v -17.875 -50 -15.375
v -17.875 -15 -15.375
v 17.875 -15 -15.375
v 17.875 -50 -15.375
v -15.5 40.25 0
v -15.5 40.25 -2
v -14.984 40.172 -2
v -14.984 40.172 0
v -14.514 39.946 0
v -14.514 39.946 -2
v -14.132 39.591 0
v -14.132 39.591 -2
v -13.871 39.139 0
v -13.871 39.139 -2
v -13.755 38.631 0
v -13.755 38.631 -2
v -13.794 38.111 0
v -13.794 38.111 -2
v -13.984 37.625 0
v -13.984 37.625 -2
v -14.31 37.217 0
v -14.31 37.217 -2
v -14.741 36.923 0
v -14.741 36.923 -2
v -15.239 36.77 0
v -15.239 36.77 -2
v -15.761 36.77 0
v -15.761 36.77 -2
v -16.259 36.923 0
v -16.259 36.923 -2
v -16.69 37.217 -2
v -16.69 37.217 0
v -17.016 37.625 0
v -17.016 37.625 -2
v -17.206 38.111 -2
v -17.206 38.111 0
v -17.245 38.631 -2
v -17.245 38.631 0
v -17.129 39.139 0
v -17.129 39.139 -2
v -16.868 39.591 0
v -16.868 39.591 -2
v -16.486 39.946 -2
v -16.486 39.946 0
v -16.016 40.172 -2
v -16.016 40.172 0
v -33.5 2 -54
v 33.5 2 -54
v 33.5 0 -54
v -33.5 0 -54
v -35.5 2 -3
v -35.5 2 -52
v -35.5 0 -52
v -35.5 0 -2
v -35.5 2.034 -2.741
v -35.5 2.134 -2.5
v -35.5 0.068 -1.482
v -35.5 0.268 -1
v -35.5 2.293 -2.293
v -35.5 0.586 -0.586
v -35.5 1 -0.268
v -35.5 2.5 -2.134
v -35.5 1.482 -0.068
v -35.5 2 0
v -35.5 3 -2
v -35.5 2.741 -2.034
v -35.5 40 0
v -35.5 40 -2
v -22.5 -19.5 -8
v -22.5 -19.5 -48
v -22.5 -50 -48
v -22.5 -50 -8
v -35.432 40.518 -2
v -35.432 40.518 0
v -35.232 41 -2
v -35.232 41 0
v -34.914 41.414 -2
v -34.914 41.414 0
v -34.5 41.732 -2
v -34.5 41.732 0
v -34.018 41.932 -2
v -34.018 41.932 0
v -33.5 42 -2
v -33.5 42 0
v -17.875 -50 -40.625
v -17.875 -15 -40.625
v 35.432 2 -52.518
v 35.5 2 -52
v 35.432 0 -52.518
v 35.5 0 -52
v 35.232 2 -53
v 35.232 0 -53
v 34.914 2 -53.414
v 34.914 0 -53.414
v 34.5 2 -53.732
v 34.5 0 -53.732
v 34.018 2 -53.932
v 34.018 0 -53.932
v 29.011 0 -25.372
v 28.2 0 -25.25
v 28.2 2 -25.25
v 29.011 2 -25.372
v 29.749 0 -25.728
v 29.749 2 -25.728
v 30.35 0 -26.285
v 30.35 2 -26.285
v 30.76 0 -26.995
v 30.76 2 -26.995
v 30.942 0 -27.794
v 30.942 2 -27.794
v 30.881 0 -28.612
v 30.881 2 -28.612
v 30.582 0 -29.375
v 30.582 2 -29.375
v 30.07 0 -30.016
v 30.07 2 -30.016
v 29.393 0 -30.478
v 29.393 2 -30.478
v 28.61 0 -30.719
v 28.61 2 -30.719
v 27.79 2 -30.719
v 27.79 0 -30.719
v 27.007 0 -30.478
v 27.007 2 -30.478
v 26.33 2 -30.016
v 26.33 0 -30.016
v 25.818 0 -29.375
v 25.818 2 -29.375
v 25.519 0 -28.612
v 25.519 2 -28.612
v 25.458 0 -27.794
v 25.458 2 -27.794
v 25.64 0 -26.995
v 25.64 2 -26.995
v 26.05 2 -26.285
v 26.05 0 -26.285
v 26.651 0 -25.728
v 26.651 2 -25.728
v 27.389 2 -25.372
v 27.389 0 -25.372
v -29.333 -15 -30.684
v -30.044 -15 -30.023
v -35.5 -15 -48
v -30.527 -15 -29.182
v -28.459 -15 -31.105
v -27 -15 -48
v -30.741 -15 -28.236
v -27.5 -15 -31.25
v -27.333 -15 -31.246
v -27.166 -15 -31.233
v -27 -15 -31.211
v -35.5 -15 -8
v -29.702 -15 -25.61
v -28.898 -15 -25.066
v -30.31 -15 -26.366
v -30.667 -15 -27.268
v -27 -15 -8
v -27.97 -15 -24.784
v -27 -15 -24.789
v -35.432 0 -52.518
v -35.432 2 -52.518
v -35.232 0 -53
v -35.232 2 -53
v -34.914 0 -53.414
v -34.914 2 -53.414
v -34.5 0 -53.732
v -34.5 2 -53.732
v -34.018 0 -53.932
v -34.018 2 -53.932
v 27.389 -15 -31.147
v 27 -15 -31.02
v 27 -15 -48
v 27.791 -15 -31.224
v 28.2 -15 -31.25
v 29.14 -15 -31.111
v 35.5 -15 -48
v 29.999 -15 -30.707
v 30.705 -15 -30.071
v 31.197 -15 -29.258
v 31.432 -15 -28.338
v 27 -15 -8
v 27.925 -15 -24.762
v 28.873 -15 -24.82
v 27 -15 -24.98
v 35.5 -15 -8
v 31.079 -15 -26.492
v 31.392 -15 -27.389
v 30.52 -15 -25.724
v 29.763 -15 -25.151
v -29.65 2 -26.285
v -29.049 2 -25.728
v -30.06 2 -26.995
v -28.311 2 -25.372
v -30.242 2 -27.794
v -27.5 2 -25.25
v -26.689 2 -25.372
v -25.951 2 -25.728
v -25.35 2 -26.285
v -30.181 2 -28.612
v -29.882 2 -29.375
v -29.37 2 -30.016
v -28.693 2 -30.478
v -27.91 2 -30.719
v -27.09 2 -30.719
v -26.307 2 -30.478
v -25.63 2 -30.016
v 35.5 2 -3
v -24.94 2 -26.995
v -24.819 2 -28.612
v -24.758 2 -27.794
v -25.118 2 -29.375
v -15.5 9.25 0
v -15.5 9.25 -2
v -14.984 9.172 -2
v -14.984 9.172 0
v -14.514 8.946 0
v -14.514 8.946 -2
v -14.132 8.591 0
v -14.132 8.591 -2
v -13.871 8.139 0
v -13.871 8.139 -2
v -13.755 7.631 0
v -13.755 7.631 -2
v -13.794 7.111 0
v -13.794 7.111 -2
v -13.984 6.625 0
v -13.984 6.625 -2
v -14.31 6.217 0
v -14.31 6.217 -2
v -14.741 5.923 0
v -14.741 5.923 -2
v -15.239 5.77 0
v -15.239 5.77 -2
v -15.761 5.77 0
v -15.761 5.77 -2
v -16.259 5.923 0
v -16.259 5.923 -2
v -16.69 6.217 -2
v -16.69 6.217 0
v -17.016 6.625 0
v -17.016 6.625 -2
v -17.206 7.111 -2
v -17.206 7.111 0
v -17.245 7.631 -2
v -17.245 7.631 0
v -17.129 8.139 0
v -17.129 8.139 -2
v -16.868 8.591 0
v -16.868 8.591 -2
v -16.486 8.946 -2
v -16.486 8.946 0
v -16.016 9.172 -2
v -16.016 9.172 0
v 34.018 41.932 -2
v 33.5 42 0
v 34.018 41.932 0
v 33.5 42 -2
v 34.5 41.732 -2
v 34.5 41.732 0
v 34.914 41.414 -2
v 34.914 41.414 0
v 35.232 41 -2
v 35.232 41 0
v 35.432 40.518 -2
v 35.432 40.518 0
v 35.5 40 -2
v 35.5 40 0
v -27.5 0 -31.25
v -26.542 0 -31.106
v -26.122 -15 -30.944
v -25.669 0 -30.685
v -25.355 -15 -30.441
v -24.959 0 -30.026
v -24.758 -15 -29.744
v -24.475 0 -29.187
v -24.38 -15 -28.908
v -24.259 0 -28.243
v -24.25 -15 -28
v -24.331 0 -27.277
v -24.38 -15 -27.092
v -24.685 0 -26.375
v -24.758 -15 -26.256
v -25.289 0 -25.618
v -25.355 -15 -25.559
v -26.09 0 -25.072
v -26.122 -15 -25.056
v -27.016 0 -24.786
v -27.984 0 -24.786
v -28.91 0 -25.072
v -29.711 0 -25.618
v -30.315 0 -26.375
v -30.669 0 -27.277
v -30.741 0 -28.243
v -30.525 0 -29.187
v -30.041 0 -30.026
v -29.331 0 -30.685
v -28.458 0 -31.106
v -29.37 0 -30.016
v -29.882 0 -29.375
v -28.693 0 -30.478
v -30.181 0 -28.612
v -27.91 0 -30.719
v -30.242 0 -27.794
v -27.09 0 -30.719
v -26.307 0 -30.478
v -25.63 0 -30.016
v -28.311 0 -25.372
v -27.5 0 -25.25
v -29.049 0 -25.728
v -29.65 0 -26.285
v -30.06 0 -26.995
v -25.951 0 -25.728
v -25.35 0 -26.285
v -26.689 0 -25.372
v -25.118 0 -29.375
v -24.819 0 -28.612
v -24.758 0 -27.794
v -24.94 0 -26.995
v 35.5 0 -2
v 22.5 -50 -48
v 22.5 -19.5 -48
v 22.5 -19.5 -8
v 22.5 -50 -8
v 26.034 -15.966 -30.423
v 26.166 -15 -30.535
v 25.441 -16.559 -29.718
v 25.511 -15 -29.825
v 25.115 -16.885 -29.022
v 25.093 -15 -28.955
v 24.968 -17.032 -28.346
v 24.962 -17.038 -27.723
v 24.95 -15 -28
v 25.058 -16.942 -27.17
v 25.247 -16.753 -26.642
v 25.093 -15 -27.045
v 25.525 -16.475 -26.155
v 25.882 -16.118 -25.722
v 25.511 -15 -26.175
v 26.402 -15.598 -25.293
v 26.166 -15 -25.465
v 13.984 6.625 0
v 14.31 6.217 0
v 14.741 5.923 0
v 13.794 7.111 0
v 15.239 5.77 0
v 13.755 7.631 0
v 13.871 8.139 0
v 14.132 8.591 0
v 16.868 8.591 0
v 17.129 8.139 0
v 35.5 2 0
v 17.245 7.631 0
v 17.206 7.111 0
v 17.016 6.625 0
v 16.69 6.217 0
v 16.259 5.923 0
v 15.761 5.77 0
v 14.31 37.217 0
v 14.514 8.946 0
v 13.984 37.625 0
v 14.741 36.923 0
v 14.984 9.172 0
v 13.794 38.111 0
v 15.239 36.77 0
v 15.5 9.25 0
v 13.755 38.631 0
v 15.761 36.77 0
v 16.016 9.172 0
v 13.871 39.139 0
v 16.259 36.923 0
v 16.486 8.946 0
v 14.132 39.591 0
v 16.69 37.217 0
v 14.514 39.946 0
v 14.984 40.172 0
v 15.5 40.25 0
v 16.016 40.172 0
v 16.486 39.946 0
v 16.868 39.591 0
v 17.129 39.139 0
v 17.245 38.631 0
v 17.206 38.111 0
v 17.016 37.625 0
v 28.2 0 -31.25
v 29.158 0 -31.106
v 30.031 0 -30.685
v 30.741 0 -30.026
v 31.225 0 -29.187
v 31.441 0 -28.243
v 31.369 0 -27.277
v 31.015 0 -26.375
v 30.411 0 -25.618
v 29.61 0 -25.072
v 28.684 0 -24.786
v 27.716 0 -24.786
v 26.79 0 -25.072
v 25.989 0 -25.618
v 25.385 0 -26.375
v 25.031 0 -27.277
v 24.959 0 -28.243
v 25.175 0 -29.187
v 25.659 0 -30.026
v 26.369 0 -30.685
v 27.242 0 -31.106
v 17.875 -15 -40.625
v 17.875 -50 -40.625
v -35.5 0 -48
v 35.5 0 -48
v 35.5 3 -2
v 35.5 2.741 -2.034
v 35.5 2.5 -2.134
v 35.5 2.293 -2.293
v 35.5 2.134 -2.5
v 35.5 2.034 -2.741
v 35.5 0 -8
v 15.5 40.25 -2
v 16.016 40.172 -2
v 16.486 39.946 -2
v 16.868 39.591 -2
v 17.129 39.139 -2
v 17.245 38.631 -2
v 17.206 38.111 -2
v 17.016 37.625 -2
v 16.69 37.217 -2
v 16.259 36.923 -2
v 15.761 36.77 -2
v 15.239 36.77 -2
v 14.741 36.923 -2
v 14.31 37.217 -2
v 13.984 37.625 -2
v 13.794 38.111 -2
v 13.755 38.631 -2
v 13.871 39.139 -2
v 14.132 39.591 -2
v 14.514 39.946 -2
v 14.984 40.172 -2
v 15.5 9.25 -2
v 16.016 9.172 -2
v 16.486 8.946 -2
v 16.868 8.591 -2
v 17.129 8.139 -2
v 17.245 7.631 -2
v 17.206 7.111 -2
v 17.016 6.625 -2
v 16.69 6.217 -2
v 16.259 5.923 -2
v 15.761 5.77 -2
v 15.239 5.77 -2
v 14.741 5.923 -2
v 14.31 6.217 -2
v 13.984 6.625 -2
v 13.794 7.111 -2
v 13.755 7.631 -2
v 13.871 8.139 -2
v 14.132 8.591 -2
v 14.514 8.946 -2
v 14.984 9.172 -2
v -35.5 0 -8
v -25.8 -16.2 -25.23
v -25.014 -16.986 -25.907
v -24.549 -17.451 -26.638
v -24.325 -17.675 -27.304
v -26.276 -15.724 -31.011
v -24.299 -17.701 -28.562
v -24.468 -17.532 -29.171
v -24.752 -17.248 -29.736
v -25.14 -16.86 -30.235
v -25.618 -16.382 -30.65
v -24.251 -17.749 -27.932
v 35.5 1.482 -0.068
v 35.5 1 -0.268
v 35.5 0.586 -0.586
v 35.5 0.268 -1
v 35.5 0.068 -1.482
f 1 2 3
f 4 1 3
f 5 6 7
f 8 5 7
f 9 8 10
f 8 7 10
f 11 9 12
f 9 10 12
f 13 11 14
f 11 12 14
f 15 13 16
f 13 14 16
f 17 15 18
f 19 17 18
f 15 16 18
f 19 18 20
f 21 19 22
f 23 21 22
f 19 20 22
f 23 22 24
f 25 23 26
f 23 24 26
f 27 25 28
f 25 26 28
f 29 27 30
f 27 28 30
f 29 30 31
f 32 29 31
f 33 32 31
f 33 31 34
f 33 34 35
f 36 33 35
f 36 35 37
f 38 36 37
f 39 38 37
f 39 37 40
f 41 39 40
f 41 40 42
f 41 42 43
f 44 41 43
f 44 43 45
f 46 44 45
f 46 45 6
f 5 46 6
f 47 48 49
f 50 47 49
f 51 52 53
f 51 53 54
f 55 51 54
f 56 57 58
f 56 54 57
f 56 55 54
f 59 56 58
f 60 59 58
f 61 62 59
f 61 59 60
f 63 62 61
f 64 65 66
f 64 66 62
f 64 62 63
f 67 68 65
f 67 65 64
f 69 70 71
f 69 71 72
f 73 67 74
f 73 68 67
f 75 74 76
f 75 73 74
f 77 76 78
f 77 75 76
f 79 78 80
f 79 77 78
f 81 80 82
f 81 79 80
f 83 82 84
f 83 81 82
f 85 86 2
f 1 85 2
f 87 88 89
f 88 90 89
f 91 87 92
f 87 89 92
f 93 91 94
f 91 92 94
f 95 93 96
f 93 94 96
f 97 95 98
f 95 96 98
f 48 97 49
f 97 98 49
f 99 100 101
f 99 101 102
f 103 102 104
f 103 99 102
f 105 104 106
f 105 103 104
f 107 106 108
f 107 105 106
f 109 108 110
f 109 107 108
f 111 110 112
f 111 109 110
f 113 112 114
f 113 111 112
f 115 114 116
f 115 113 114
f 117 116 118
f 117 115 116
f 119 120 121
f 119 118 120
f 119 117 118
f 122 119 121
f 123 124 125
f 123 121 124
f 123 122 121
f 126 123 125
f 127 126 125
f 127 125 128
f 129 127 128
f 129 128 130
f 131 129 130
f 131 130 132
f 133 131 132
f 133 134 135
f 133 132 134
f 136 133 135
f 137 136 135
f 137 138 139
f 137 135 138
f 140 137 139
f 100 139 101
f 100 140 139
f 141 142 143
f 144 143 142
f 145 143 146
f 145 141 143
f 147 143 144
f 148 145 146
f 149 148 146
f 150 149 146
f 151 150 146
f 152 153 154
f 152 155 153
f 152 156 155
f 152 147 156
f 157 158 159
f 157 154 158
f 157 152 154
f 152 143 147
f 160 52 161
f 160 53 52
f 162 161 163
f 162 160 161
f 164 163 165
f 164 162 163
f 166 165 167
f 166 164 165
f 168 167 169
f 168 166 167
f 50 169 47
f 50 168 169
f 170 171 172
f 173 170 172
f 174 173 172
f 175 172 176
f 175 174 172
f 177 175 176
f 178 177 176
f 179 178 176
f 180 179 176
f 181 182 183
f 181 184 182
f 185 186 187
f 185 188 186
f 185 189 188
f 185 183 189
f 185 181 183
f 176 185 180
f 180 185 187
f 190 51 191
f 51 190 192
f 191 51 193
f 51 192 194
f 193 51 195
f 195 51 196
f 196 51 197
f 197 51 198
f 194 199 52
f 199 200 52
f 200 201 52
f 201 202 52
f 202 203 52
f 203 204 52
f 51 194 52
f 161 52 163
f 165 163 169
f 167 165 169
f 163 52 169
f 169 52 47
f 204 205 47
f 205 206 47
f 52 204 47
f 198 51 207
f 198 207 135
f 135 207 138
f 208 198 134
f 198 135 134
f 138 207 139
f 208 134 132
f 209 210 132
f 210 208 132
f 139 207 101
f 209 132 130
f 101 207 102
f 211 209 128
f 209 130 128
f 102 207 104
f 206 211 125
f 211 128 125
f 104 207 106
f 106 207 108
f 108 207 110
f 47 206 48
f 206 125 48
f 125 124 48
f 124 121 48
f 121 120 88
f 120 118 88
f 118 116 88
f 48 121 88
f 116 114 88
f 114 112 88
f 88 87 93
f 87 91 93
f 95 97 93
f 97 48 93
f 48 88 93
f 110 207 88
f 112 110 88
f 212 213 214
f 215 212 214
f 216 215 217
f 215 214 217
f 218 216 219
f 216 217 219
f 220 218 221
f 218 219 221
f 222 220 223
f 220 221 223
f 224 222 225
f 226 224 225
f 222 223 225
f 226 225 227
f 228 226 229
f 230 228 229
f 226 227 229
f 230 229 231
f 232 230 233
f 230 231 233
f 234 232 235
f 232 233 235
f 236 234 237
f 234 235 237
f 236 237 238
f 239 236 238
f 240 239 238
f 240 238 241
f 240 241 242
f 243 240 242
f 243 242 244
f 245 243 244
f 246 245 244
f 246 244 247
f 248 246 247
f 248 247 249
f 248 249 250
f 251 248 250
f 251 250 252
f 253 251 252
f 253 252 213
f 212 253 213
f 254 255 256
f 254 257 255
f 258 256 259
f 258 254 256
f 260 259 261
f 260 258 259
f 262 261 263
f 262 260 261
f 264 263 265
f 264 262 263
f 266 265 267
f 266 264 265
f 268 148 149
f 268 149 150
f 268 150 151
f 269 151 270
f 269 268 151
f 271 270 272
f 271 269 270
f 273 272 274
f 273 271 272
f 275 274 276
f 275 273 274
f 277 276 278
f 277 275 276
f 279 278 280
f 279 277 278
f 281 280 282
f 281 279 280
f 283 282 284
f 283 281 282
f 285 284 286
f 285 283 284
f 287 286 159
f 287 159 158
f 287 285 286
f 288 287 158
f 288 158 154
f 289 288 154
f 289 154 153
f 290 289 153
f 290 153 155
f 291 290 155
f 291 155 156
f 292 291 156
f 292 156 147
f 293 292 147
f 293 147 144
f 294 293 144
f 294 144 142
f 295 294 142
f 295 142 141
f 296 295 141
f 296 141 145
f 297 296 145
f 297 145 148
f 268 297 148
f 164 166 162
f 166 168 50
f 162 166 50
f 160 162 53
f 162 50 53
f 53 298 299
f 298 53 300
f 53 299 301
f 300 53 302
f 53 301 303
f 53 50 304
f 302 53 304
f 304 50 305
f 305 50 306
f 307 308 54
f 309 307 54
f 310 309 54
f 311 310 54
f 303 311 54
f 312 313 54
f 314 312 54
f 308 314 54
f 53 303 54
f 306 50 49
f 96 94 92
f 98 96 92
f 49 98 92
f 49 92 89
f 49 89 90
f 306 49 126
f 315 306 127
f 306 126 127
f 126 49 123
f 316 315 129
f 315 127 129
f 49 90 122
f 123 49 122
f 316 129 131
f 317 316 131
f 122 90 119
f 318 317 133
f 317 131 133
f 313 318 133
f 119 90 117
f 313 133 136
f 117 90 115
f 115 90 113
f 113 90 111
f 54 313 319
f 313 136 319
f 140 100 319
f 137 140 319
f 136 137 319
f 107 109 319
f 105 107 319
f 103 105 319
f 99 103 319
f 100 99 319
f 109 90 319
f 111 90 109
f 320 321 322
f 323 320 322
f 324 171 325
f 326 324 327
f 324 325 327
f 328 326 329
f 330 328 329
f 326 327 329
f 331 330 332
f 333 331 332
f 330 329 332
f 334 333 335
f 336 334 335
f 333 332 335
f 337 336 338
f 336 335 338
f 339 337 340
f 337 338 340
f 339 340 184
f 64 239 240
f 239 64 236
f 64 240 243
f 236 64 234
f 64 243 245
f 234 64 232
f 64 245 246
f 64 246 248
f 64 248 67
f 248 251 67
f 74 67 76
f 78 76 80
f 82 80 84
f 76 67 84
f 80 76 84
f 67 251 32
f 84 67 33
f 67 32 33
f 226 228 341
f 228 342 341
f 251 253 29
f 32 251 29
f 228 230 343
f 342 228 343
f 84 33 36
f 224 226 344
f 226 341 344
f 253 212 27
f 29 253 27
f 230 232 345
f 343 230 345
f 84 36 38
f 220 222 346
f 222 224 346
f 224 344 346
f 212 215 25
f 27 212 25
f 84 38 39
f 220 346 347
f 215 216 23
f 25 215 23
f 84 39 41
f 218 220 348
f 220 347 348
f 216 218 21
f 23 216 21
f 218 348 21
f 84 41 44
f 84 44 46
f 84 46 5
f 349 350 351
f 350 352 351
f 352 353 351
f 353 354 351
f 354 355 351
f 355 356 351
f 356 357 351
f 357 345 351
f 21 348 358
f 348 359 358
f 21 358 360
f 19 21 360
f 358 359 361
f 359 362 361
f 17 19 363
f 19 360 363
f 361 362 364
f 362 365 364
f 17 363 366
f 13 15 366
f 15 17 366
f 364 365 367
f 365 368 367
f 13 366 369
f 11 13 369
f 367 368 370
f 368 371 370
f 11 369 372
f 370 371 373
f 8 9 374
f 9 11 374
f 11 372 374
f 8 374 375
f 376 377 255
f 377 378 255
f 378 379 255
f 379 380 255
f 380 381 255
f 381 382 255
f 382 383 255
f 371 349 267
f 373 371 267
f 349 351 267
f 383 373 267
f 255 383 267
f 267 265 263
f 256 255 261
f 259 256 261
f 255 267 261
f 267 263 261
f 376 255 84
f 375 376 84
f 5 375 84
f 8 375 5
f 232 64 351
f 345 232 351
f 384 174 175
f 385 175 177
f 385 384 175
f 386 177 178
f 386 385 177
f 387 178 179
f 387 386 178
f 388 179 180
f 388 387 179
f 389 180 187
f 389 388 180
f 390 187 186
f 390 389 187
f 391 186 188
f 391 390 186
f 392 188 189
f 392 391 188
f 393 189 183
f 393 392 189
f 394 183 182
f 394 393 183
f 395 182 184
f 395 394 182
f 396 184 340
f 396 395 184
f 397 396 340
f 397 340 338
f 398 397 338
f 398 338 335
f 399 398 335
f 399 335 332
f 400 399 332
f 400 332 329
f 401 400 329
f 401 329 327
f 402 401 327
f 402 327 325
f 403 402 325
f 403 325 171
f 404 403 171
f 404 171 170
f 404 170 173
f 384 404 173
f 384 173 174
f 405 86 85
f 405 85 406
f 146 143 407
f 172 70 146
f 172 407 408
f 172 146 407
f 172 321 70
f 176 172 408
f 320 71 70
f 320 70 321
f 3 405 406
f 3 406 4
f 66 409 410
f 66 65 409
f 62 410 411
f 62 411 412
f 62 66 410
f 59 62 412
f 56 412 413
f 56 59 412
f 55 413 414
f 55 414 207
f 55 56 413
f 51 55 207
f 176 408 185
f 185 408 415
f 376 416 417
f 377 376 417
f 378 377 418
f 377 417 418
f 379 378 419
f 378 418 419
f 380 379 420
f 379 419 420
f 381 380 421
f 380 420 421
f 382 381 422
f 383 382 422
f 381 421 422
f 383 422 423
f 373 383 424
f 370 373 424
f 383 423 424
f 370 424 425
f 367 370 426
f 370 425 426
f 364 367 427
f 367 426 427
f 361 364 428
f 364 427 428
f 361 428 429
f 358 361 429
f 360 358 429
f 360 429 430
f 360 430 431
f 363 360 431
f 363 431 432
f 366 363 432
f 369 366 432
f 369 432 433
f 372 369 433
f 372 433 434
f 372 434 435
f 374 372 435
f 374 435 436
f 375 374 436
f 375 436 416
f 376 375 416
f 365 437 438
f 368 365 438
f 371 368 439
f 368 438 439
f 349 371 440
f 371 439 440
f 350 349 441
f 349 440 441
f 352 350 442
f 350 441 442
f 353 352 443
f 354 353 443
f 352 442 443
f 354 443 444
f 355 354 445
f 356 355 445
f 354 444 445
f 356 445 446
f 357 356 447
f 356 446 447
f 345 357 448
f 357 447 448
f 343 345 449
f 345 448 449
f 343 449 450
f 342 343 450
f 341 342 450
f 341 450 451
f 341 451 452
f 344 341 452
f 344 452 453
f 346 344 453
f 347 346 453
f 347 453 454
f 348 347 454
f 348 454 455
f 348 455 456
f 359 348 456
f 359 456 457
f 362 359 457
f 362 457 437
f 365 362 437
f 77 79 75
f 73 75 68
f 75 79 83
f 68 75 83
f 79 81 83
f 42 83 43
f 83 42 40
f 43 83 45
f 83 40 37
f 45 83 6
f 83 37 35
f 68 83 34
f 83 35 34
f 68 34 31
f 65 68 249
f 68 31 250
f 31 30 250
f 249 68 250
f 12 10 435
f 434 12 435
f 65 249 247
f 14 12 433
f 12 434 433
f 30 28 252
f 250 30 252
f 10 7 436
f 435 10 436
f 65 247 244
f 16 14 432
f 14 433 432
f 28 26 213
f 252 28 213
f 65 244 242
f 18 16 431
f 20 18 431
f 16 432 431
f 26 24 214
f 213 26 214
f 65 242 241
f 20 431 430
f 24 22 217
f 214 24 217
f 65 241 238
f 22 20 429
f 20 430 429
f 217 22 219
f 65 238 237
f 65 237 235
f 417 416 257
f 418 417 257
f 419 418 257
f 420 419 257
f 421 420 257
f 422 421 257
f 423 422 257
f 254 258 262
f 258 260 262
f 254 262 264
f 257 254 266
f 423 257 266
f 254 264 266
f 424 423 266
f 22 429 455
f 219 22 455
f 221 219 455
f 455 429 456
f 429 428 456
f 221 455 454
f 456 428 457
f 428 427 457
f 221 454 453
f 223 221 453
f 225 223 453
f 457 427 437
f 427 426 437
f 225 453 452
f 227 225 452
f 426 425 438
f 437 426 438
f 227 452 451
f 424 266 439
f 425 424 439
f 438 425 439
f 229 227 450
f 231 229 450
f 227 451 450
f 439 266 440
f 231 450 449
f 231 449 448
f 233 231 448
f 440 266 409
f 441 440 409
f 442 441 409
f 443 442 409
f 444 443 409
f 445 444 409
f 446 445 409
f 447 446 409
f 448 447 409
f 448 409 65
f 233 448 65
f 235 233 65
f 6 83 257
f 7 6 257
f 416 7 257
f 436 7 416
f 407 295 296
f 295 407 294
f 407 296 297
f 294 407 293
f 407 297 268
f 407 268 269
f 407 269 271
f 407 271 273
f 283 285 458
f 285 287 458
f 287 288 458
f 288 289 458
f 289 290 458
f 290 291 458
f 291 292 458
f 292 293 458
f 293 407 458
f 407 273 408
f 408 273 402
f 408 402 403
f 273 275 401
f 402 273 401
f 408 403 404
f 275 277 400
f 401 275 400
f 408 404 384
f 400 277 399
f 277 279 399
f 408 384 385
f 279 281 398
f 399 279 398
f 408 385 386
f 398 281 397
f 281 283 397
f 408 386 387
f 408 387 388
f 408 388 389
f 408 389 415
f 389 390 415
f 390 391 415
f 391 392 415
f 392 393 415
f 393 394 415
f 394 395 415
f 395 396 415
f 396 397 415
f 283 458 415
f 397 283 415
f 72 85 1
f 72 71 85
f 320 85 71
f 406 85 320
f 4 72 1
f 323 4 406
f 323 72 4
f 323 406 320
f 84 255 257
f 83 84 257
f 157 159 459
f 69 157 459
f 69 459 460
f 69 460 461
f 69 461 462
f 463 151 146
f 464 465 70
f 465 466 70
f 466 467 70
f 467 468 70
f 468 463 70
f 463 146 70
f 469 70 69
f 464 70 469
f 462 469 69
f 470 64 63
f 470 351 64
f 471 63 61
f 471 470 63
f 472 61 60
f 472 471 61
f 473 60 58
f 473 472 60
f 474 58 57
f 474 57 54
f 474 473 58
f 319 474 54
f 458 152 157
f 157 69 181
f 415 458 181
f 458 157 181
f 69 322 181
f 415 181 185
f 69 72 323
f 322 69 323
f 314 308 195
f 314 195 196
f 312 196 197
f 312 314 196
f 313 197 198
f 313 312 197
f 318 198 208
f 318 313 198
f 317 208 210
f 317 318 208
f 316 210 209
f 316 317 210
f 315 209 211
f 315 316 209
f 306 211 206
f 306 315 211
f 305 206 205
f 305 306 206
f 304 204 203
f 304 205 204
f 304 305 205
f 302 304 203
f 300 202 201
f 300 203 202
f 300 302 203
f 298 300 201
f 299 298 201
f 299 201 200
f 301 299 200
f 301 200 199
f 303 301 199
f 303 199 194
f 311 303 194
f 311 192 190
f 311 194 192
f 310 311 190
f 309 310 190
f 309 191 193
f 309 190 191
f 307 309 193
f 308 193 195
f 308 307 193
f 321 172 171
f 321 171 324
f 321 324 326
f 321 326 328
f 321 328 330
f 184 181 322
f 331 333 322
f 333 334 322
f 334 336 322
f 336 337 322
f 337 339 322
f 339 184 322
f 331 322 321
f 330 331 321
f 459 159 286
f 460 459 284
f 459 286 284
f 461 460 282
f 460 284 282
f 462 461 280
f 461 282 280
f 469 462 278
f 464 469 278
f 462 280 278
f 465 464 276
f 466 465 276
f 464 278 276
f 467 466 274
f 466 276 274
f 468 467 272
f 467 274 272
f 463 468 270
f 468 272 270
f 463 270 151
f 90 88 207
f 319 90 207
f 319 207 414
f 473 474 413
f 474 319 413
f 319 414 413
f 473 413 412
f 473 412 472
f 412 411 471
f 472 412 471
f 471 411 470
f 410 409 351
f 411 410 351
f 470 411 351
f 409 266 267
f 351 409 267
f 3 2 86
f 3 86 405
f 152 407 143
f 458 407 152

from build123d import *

# Parameters (mm, degrees)
RESSALTO_EXTRUS_O1_DEPTH   = 35.5
CORTE_EXTRUS_O1_DEPTH      = 77.001644719
CORTE_EXTRUS_O1_DEPTH_BACK = 77.001644719
ESBO_O2_R                  = 2.75
FILETE1_R                  = 2
FILETE2_R                  = 1
ESBO_O3_R                  = 1.75
CORTE_EXTRUS_O2_DEPTH      = 76.685203309
ESBO_O4_W                  = 71
ESBO_O4_H                  = 40
ESBO_O4_R                  = 3.25
RESSALTO_EXTRUS_O2_DEPTH   = 15
ESBO_O5_W                  = 45
ESBO_O5_H                  = 40
ESBO_O5_W_2                = 35.75
ESBO_O5_H_2                = 25.25
RESSALTO_EXTRUS_O3_DEPTH   = 35
CHANFRO1_SIZE              = 4.5


with BuildPart() as part:
    # Esboço1 → Ressalto-extrusão1 (new, symmetric)
    with BuildSketch(Plane(origin=(0, 0, 0), x_dir=(0, 0, -1), z_dir=(1, 0, 0))):
        Polygon((0, 0), (0, 42), (2, 42), (2, 2), (54, 2), (54, 0), align=None)
    extrude(amount=RESSALTO_EXTRUS_O1_DEPTH, both=True)

    # Esboço2 → Corte-extrusão1 (cut, two sides: drawn at the far end of the back side and taken through both)
    with BuildSketch(Plane(origin=(0, 2, 0), x_dir=(1, 0, 0), z_dir=(0, 1, 0)).offset(-CORTE_EXTRUS_O1_DEPTH_BACK)):
        with Locations(Location((-27.5, 28, 0), (0, 0, 270))):
            Circle(ESBO_O2_R)
        with Locations(Location((28.2, 28, 0), (0, 0, 270))):
            Circle(ESBO_O2_R)
    extrude(amount=CORTE_EXTRUS_O1_DEPTH + CORTE_EXTRUS_O1_DEPTH_BACK, mode=Mode.SUBTRACT)

    # Filete1
    filete1_edges = [part.edges().sort_by_distance(p)[0] for p in [
        (0, 0, 0),
        (35.5, 42, -1),
        (-35.5, 42, -1),
        (-35.5, 1, -54),
        (35.5, 1, -54),
    ]]
    fillet(filete1_edges, radius=FILETE1_R)

    # Filete2
    filete2_edges = [part.edges().sort_by_distance(p)[0] for p in [
        (0, 2, -2),
    ]]
    fillet(filete2_edges, radius=FILETE2_R)

    # Esboço3 → Corte-extrusão2 (cut, through all)
    with BuildSketch(Plane(origin=(0, 0, -2), x_dir=(-1, 0, 0), z_dir=(0, 0, -1))):
        with Locations(Location((-15.5, 38.5, 0), (0, 0, 90))):
            Circle(ESBO_O3_R)
        with Locations(Location((15.5, 38.5, 0), (0, 0, 90))):
            Circle(ESBO_O3_R)
        with Locations(Location((15.5, 7.5, 0), (0, 0, 90))):
            Circle(ESBO_O3_R)
        with Locations(Location((-15.5, 7.5, 0), (0, 0, 90))):
            Circle(ESBO_O3_R)
    extrude(amount=-CORTE_EXTRUS_O2_DEPTH, mode=Mode.SUBTRACT)


with BuildPart() as body_2:
    # Esboço4 → Ressalto-extrusão2 (new body)
    with BuildSketch(Plane.XZ):
        with Locations((0, -28)):
            Rectangle(ESBO_O4_W, ESBO_O4_H)
        with Locations(Location((-27.5, -28, 0), (0, 0, 270))):
            Circle(ESBO_O4_R, mode=Mode.SUBTRACT)
        with Locations(Location((28.2, -28, 0), (0, 0, 270))):
            Circle(ESBO_O4_R, mode=Mode.SUBTRACT)
    extrude(amount=RESSALTO_EXTRUS_O2_DEPTH)

    # Esboço5 → Ressalto-extrusão3 (add)
    with BuildSketch(Plane.XZ.offset(15)):
        with Locations((0, -28)):
            Rectangle(ESBO_O5_W, ESBO_O5_H)
        with Locations((0, -28)):
            Rectangle(ESBO_O5_W_2, ESBO_O5_H_2, mode=Mode.SUBTRACT)
    extrude(amount=RESSALTO_EXTRUS_O3_DEPTH)

    # Chanfro1
    # the kernel refuses this chamfer: 4.5 mm, written as the material it adds along each edge
    with BuildSketch(Plane(origin=(-22.5, -15, -48), x_dir=(-0.9996219169112966, 0.0274958766105864, 0), z_dir=(0, 0, 1))) as chanfro1_piece_1_section:
        Polygon((CHANFRO1_SIZE * 0.999621916911, CHANFRO1_SIZE * 0.0274958766106), (-CHANFRO1_SIZE * 0.0274958766106, CHANFRO1_SIZE * 0.999621916911), (0, 0), align=None)
    chanfro1_piece_1 = extrude(amount=40, mode=Mode.PRIVATE)
    chanfro1_piece_1 = chanfro1_piece_1 - Plane(origin=(-27.5, -16.515606652, -28), x_dir=(0, 0, -1), z_dir=(0, 1, 0)) * Cylinder(3.25, 98, mode=Mode.PRIVATE)
    add(chanfro1_piece_1)
    with BuildSketch(Plane(origin=(22.5, -15, -8), x_dir=(0.9996219169112966, 0.0274958766105864, 0), z_dir=(0, 0, -1))) as chanfro1_piece_2_section:
        Polygon((CHANFRO1_SIZE * 0.999621916911, CHANFRO1_SIZE * 0.0274958766106), (-CHANFRO1_SIZE * 0.0274958766106, CHANFRO1_SIZE * 0.999621916911), (0, 0), align=None)
    chanfro1_piece_2 = extrude(amount=40, mode=Mode.PRIVATE)
    chanfro1_piece_2 = chanfro1_piece_2 - Plane(origin=(28.2, -16.504829355, -28), x_dir=(0, 0, -1), z_dir=(0, 1, 0)) * Cylinder(3.25, 98, mode=Mode.PRIVATE)
    add(chanfro1_piece_2)


solid = Compound([part.part, body_2.part])
